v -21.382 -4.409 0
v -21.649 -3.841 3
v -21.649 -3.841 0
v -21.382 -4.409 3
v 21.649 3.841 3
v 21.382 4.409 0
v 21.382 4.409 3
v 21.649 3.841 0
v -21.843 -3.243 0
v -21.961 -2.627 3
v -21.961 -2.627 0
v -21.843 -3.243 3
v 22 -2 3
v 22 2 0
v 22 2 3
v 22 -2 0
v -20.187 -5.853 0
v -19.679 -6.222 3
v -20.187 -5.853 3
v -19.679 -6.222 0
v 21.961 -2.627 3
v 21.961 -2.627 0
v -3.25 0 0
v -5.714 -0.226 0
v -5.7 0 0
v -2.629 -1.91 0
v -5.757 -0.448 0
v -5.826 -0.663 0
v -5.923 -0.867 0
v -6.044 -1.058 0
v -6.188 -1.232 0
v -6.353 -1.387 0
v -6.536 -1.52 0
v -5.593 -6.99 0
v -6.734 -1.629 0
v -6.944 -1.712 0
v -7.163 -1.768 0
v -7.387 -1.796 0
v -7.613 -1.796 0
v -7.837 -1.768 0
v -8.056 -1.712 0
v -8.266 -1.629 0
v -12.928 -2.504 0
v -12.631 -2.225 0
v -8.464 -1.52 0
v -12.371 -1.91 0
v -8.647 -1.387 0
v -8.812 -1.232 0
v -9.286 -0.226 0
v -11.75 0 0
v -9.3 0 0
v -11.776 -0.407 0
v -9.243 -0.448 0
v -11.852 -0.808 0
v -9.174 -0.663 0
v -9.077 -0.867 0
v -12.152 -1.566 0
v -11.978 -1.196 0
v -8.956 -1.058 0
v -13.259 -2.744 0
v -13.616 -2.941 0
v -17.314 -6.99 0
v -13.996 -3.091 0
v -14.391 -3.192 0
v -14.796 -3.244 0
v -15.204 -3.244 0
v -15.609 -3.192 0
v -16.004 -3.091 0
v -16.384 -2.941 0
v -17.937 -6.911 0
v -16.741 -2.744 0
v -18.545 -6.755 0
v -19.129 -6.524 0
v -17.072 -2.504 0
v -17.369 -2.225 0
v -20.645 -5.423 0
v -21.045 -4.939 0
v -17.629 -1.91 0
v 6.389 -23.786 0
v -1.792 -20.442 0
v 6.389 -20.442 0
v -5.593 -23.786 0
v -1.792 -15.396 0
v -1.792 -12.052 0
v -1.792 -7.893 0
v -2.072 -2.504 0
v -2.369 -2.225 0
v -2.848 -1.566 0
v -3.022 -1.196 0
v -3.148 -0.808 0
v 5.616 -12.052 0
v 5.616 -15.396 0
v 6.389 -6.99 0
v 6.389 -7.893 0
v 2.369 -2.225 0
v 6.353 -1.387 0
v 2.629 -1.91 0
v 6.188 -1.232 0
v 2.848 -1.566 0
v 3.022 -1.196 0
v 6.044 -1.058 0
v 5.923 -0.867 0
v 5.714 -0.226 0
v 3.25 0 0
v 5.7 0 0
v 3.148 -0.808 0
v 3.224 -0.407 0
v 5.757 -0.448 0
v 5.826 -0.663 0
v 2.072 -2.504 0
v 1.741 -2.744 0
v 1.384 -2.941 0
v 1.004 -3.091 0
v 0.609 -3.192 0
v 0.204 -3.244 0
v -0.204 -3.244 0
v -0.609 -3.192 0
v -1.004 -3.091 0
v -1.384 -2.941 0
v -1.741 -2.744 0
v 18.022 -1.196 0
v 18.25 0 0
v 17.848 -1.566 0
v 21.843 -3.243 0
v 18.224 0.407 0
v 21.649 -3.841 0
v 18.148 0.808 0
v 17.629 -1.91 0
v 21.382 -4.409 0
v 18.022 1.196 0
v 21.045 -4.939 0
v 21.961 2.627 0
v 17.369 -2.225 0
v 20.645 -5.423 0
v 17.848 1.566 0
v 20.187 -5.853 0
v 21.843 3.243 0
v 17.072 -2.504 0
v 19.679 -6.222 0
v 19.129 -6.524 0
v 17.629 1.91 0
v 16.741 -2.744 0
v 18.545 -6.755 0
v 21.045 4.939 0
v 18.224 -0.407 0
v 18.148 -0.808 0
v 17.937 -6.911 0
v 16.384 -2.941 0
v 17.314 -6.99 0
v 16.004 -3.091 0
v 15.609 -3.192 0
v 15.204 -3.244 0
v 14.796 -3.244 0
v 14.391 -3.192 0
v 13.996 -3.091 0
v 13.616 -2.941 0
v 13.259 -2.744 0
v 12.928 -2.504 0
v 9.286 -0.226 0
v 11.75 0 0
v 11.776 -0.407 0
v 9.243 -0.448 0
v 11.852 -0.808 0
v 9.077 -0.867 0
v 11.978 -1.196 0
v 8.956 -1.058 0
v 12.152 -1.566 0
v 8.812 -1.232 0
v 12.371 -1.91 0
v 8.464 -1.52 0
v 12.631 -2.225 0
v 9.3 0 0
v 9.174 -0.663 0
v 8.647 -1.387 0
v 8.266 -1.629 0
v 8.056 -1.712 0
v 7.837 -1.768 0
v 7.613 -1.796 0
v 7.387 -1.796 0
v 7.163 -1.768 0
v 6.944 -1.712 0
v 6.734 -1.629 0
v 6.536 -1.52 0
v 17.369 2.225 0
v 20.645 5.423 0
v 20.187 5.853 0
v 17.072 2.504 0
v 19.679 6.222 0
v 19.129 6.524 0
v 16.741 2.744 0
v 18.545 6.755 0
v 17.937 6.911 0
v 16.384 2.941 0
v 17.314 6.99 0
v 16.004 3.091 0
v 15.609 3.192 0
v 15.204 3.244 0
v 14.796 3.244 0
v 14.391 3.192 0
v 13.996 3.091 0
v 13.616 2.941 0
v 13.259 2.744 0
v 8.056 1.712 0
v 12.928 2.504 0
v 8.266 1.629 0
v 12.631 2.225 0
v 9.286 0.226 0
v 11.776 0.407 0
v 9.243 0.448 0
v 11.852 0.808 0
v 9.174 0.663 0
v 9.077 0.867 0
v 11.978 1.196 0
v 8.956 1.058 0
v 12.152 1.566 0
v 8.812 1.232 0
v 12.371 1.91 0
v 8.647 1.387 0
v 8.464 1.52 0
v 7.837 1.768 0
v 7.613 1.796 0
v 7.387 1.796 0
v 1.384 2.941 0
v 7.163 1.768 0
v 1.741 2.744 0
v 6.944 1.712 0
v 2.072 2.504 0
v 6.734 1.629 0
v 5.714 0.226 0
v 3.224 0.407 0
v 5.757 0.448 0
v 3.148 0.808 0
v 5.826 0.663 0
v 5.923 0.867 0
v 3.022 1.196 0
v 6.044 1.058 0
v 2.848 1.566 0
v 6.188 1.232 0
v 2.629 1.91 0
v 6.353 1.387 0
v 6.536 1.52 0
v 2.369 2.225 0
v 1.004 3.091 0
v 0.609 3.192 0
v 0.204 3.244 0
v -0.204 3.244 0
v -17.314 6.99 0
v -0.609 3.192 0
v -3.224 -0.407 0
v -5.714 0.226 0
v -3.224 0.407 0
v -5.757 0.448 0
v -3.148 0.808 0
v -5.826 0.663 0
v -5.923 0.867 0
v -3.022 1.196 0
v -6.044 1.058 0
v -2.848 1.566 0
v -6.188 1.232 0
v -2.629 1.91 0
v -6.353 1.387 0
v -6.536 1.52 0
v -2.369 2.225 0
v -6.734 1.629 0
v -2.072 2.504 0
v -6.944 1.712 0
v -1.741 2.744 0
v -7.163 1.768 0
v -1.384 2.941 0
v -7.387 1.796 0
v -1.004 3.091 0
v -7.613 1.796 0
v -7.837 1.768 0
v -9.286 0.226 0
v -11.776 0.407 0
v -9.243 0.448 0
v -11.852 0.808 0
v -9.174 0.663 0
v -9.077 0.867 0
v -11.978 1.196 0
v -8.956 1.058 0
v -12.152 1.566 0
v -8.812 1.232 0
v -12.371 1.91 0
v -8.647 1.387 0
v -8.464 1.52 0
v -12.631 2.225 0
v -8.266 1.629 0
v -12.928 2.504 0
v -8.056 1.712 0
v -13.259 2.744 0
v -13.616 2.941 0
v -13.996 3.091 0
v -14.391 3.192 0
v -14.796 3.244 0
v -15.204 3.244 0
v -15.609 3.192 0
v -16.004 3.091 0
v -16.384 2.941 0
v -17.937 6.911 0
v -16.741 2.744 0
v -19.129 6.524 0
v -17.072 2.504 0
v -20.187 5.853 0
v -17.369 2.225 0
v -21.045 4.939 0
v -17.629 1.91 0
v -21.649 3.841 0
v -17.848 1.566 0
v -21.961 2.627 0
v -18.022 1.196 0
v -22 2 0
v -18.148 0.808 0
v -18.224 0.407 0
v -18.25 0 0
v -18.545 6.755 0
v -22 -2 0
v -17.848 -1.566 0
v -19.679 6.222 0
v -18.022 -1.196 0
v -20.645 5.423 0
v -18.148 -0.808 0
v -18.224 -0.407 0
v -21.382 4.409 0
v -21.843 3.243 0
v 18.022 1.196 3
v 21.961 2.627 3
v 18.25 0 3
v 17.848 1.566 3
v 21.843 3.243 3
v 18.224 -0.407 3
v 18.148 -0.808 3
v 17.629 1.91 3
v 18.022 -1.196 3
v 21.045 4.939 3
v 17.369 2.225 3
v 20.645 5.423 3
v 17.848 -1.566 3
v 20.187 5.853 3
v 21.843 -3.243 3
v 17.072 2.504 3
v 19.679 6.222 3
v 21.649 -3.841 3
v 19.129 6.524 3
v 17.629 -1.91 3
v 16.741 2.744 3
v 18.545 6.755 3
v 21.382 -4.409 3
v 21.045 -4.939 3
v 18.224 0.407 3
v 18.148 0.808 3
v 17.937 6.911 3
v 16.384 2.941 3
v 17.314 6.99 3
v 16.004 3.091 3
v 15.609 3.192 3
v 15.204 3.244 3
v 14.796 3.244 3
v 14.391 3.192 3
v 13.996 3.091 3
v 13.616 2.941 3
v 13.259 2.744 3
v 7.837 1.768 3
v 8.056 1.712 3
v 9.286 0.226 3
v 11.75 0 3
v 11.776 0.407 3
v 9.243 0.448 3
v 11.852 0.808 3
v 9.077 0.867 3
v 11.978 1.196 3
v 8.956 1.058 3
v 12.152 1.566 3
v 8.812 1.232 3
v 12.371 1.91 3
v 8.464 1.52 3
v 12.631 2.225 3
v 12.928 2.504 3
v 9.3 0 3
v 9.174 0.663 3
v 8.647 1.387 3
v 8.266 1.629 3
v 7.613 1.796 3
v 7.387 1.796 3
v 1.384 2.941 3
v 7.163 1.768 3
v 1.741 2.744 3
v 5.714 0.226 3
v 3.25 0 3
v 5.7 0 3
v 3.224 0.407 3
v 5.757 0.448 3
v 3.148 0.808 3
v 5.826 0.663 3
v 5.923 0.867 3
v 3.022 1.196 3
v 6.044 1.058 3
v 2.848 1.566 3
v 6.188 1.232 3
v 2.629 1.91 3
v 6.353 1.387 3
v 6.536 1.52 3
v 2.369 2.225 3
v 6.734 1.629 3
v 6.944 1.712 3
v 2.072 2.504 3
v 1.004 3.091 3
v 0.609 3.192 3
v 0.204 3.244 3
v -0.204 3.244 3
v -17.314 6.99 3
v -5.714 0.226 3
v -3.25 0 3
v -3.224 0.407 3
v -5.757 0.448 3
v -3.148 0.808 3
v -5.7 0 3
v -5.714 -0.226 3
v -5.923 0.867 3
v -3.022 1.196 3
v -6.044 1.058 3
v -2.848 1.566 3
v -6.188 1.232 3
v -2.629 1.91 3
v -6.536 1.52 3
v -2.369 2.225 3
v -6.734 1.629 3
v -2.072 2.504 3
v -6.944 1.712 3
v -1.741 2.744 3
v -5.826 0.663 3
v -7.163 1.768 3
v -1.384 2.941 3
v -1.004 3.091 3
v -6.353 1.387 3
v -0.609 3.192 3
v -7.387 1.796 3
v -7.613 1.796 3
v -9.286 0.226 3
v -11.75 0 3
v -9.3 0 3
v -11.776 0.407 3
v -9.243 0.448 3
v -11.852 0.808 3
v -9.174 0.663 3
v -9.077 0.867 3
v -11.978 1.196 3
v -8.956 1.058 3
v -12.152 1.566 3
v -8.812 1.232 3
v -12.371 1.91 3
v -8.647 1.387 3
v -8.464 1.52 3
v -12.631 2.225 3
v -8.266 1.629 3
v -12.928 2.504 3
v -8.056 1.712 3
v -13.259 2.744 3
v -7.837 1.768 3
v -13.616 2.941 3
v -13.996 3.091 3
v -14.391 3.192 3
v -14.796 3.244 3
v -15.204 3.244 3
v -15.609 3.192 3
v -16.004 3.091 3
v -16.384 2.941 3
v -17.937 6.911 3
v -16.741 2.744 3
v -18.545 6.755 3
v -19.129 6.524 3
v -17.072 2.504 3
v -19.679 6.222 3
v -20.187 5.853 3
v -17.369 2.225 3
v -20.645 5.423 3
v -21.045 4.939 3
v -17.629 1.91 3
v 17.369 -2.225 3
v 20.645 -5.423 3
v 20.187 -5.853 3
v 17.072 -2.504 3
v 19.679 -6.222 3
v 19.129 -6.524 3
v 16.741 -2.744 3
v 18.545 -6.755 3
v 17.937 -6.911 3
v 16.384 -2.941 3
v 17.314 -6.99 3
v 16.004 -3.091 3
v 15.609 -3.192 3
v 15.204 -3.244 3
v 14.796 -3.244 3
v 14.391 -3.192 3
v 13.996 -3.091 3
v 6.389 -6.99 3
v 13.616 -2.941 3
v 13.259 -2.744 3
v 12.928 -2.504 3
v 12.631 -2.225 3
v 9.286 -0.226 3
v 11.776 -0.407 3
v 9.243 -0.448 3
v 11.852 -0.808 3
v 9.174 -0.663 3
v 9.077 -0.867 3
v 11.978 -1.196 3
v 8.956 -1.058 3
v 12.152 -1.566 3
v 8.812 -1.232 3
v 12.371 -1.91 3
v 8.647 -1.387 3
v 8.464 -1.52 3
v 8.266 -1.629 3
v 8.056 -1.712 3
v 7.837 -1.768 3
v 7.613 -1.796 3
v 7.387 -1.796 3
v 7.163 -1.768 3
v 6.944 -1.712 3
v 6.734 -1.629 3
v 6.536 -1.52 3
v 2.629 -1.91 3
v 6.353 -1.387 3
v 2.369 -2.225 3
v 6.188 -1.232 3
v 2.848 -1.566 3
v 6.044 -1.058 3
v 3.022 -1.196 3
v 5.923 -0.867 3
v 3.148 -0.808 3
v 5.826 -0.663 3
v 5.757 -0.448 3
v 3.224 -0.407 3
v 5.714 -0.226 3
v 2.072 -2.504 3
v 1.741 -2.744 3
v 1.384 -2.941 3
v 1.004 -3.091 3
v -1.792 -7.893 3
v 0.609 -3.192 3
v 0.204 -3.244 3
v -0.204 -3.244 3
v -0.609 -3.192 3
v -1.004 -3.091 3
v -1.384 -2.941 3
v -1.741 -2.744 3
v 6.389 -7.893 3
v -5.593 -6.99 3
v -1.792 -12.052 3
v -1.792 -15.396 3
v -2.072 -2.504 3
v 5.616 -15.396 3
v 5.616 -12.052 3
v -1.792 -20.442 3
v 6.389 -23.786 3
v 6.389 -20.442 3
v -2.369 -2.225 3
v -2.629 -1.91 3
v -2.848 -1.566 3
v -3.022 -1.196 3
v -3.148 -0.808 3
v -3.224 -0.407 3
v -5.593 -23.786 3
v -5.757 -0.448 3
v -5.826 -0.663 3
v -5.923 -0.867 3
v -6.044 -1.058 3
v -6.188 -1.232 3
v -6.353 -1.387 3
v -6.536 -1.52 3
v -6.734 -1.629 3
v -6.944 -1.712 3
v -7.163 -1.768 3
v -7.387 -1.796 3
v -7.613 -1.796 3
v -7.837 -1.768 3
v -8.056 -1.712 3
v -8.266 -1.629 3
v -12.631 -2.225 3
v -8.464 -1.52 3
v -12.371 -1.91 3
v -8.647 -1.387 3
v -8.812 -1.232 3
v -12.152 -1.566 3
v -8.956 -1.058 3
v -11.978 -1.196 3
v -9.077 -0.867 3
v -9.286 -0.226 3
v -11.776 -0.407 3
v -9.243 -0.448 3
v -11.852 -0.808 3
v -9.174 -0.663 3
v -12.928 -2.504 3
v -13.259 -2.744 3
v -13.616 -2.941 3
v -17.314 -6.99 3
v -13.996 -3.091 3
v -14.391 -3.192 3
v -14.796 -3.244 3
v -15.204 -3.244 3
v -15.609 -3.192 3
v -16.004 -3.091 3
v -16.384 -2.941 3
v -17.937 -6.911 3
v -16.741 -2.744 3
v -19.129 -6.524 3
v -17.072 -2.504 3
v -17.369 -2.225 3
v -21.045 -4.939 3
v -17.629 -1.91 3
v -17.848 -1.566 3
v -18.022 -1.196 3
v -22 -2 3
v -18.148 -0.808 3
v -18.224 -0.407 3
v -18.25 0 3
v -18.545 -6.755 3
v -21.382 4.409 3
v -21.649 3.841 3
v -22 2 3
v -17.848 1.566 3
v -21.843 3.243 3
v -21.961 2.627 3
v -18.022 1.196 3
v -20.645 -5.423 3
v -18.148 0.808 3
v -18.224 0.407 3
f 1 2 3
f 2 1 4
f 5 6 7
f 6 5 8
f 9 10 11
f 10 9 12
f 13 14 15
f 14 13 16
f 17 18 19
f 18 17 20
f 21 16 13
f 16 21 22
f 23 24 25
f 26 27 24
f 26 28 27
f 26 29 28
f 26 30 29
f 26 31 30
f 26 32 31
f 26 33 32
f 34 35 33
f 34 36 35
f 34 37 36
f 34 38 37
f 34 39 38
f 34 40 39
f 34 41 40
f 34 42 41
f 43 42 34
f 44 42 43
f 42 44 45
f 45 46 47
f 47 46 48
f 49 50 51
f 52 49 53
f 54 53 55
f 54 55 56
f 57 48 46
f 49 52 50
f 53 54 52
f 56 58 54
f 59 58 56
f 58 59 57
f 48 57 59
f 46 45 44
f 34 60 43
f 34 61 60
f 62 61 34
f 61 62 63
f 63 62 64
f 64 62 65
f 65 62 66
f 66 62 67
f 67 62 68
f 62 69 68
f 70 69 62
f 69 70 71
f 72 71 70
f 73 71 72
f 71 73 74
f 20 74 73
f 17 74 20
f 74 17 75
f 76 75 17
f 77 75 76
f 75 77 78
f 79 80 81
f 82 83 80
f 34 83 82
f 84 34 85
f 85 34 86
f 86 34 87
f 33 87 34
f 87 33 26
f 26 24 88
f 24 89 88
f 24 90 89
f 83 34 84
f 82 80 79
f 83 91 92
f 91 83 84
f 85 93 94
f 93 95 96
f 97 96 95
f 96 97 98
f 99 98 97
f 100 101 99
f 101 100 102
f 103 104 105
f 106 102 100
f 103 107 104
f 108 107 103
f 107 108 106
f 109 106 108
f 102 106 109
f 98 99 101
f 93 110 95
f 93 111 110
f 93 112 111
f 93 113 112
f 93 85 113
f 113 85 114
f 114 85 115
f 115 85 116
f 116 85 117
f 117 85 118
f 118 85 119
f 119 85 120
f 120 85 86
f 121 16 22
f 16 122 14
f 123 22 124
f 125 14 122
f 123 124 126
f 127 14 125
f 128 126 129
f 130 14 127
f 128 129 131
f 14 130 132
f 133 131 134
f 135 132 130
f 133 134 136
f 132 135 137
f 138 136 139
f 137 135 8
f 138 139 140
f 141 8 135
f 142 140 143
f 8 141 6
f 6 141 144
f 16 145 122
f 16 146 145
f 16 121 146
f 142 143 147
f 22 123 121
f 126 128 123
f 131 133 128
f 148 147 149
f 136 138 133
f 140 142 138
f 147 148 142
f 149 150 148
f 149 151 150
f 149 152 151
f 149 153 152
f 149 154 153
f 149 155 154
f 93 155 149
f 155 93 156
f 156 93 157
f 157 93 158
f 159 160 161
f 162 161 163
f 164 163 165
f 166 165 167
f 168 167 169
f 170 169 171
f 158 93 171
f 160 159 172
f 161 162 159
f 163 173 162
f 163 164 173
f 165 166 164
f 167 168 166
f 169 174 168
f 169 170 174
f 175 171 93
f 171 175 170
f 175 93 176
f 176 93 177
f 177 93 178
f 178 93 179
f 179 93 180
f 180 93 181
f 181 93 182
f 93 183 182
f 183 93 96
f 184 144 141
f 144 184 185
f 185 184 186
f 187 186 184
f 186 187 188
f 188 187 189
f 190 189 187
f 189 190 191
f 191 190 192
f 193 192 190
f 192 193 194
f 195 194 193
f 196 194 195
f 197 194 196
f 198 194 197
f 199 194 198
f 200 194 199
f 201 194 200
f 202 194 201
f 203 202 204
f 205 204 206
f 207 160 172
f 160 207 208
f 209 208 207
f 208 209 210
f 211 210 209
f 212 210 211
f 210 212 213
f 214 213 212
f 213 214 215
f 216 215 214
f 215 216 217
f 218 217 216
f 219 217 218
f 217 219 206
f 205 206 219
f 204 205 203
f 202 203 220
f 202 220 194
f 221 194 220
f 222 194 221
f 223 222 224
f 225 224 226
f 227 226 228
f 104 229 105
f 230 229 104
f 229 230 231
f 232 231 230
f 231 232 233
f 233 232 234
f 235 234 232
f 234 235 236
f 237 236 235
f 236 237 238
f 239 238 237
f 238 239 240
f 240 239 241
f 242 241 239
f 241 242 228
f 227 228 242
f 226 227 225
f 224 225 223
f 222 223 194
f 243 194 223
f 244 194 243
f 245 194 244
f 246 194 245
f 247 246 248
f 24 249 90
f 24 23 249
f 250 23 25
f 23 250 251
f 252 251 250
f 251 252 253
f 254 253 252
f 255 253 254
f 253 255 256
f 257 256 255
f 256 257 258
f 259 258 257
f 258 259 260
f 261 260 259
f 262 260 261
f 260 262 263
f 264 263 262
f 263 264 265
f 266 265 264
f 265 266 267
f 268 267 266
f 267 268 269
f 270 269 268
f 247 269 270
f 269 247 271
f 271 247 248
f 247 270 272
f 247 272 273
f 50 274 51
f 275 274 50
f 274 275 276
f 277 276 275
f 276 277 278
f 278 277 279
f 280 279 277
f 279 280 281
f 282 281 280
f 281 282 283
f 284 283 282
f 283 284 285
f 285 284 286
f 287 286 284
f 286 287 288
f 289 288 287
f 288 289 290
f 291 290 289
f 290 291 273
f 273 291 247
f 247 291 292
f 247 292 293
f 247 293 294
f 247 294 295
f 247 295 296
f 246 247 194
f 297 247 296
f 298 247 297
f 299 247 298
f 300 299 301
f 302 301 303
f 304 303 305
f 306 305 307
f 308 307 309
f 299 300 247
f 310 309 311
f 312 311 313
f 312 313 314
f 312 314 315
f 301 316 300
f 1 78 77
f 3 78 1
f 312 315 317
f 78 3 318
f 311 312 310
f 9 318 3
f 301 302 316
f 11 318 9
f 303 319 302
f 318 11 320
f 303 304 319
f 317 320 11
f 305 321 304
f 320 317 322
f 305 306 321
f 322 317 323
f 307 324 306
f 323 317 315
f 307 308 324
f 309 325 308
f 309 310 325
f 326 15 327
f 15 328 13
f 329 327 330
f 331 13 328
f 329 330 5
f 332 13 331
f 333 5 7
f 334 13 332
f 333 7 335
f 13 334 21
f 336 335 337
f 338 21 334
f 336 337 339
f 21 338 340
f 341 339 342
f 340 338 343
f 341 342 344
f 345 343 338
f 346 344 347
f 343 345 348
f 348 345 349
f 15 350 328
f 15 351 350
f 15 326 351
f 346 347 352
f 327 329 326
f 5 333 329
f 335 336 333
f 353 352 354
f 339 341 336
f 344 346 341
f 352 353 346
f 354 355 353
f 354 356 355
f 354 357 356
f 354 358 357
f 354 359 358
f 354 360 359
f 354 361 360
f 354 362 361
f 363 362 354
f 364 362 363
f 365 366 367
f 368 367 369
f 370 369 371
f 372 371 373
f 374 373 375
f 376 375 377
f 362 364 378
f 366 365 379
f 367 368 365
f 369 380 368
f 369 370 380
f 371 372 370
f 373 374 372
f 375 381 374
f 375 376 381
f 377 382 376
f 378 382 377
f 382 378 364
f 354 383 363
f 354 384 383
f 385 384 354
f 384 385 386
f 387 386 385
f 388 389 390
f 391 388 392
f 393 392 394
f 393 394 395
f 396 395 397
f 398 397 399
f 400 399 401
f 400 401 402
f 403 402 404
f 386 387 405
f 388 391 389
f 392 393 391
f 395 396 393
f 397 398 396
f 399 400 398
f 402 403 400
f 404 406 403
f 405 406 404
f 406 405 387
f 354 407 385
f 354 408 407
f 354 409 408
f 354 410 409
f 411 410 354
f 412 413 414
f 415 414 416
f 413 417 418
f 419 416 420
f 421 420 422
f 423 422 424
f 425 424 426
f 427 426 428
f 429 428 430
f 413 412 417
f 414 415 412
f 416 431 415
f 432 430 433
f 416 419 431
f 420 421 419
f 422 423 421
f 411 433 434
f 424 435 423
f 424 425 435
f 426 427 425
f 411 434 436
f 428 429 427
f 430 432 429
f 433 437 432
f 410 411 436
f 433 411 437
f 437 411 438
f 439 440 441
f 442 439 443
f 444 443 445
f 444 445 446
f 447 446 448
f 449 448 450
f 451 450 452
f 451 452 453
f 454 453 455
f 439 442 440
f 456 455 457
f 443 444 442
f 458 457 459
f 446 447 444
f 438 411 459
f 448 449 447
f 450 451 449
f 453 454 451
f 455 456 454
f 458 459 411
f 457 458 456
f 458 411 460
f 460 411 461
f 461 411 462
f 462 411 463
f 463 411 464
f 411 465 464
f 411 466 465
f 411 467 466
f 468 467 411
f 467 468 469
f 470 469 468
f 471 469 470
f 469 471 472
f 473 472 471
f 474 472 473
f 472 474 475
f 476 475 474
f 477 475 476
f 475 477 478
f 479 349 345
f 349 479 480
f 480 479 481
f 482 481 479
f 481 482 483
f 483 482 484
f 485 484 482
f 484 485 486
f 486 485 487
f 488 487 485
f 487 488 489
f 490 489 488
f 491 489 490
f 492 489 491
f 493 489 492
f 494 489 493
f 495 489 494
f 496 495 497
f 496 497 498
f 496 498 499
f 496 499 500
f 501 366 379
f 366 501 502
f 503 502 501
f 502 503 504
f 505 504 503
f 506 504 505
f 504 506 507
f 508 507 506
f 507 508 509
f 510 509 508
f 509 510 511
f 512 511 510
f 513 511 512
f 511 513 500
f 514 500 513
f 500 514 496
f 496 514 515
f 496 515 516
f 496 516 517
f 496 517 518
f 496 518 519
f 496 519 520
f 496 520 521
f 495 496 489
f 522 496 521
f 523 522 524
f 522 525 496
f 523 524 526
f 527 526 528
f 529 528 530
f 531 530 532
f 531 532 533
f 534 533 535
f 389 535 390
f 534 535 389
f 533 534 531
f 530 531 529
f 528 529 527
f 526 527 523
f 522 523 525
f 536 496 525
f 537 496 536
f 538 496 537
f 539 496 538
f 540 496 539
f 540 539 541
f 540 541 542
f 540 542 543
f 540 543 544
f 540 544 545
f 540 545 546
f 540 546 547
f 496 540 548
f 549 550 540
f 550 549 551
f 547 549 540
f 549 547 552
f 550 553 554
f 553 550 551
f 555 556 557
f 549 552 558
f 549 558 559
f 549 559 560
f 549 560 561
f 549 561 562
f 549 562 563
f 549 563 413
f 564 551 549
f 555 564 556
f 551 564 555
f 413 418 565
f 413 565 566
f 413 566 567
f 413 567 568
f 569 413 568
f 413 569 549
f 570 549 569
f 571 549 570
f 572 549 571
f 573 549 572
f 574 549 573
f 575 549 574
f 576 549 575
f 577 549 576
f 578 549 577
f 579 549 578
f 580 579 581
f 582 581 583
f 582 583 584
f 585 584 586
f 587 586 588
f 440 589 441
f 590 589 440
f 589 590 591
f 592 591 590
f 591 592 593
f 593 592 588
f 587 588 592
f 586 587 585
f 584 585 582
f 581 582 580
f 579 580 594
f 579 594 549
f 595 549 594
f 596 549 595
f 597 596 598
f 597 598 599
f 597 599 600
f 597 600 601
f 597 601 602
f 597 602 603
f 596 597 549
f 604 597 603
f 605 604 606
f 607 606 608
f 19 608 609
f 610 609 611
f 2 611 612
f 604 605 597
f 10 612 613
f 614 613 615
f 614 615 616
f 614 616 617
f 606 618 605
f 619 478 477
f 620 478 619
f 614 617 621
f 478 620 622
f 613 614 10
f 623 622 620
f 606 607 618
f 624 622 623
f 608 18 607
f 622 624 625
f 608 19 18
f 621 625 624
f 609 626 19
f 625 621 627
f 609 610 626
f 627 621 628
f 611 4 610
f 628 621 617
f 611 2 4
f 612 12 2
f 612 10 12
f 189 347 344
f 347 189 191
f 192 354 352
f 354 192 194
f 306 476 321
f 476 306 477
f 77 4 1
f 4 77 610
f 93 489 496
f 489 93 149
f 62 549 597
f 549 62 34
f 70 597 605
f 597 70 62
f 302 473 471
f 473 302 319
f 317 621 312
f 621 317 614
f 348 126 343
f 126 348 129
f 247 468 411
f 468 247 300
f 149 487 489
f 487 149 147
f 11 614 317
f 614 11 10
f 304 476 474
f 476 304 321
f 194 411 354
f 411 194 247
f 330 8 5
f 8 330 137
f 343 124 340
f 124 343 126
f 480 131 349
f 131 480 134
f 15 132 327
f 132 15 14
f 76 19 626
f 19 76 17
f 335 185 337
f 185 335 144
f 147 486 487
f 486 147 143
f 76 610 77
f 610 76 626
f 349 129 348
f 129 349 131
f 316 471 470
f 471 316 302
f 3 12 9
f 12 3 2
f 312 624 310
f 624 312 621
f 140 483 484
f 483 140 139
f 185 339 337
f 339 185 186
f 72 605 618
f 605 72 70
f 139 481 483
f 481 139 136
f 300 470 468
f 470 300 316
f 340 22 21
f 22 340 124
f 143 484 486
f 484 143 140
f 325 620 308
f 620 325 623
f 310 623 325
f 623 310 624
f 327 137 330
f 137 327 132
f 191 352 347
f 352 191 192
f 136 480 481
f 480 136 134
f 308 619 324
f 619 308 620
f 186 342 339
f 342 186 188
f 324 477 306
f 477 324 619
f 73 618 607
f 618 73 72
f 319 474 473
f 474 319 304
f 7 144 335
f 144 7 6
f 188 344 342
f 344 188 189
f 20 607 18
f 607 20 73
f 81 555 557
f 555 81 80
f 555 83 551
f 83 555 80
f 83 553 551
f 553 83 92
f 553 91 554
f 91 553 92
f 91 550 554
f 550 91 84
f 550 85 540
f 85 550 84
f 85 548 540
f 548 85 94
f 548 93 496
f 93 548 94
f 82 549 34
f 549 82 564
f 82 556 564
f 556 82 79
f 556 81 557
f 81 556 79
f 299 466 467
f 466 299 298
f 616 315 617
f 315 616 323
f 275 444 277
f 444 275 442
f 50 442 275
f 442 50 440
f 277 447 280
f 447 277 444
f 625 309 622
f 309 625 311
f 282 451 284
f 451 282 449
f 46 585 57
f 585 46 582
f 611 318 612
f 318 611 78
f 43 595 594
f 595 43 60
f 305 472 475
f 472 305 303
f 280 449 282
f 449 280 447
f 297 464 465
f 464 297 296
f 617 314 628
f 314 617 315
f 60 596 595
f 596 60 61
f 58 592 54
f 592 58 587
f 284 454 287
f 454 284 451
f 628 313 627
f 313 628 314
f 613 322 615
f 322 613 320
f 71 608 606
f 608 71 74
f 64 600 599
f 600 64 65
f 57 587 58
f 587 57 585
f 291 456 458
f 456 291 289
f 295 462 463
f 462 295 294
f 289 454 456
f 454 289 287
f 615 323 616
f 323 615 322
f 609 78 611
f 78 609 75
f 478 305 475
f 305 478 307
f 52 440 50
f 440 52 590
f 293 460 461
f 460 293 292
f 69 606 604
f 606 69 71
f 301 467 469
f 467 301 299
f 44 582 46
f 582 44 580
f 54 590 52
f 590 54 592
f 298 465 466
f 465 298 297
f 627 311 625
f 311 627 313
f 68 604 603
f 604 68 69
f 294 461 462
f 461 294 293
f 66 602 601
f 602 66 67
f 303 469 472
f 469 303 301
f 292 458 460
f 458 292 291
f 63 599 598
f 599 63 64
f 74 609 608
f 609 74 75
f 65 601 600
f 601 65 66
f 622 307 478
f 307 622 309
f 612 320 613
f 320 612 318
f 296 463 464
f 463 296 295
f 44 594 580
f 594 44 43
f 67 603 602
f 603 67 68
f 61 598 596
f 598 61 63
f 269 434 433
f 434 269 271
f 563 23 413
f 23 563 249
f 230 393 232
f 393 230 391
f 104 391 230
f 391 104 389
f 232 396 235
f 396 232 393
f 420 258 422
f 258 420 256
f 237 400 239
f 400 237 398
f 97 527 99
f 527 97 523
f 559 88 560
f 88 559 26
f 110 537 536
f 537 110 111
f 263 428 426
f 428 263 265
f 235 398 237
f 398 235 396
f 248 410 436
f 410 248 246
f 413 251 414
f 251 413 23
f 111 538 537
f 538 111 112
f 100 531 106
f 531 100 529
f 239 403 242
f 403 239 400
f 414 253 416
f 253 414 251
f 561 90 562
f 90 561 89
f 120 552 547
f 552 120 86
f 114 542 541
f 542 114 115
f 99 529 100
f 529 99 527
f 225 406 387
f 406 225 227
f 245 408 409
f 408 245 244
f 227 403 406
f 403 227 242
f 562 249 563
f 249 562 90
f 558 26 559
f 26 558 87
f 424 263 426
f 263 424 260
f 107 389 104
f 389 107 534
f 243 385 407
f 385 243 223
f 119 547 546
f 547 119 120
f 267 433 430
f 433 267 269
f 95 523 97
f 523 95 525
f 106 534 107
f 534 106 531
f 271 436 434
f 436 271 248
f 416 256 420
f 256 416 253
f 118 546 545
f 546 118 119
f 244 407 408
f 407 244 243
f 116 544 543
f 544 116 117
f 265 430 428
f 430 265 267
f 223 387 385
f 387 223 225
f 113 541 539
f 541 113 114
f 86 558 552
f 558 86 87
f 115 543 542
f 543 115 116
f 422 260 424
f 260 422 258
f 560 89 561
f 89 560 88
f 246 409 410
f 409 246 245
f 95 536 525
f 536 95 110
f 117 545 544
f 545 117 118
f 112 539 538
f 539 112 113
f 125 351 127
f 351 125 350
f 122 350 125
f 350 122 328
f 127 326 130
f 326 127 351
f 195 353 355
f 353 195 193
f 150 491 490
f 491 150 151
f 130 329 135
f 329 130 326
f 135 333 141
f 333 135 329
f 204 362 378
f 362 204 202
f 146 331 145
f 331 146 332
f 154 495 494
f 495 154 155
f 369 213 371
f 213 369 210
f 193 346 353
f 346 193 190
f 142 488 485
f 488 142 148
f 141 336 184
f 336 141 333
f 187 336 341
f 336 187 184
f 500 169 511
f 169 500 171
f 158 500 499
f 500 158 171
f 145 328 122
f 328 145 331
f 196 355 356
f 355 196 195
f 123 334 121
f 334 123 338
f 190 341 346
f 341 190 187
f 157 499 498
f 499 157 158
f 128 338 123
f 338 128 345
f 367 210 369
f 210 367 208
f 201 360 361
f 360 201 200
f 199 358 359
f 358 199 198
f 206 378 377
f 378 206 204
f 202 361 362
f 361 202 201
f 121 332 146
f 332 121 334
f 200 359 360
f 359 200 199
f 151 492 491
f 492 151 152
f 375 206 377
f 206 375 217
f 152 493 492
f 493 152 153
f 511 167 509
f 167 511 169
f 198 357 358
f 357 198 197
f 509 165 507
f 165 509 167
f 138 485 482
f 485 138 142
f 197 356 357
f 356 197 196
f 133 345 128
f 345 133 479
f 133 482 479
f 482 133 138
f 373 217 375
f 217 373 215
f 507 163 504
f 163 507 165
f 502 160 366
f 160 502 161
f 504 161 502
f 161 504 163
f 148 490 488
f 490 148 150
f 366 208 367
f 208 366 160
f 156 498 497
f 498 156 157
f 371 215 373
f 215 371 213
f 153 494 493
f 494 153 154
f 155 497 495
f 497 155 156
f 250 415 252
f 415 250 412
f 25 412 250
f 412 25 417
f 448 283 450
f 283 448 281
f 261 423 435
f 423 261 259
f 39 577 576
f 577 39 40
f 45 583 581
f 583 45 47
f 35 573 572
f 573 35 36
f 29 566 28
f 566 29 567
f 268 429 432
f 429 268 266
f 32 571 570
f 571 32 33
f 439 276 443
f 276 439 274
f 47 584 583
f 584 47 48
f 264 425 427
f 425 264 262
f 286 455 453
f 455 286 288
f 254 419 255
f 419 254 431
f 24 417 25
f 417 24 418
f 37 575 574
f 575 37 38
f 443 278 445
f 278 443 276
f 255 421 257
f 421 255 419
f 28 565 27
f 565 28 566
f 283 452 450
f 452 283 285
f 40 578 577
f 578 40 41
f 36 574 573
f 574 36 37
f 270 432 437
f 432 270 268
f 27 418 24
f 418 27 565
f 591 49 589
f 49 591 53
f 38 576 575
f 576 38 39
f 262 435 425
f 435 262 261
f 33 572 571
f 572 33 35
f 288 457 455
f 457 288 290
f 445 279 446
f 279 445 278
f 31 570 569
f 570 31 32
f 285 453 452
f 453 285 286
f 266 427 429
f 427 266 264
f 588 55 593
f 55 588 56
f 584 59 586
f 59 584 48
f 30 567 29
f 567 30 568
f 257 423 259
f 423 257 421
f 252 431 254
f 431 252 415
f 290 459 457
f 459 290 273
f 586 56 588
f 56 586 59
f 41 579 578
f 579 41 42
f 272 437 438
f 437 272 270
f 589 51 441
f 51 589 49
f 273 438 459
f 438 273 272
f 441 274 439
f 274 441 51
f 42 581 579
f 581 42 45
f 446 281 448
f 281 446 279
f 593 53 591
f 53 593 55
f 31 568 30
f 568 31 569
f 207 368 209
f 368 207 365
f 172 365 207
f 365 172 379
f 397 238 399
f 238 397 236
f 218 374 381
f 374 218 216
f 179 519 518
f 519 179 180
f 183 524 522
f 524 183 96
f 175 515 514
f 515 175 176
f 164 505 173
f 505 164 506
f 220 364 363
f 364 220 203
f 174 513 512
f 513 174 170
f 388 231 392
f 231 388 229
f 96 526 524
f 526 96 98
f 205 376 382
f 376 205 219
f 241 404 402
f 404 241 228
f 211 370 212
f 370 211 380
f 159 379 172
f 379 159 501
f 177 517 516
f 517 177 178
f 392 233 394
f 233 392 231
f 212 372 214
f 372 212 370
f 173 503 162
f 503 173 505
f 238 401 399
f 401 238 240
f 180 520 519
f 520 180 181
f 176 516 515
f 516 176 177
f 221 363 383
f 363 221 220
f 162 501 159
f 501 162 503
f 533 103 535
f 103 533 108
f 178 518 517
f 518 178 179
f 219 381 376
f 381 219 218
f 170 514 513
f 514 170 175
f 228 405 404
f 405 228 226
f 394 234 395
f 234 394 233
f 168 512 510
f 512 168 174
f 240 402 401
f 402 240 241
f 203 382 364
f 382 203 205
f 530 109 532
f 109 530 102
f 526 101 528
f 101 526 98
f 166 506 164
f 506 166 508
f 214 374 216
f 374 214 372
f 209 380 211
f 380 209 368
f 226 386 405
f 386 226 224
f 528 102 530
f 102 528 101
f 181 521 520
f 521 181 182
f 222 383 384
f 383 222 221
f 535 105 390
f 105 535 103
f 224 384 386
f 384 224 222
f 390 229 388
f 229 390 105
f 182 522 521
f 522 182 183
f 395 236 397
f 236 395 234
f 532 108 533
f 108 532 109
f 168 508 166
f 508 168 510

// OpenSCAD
$fn = 50;


difference() {
	union() {
		hull() {
			translate(v = [-17.0000000000, 2.0000000000, 0]) {
				cylinder(h = 3, r = 5);
			}
			translate(v = [17.0000000000, 2.0000000000, 0]) {
				cylinder(h = 3, r = 5);
			}
			translate(v = [-17.0000000000, -2.0000000000, 0]) {
				cylinder(h = 3, r = 5);
			}
			translate(v = [17.0000000000, -2.0000000000, 0]) {
				cylinder(h = 3, r = 5);
			}
		}
		translate(v = [0, -5, 0]) {
			linear_extrude(height = 3) {
				text(font = "DejaVu Sans Mono:style=Bold", halign = "center", size = 19.0000000000, text = "E", valign = "top");
			}
		}
	}
	union() {
		translate(v = [-15.0000000000, 0.0000000000, 0]) {
			translate(v = [0, 0, -100]) {
				cylinder(h = 200, r = 3.2500000000);
			}
		}
		translate(v = [0, 0, -100]) {
			cylinder(h = 200, r = 3.2500000000);
		}
		translate(v = [15.0000000000, 0.0000000000, 0]) {
			translate(v = [0, 0, -100]) {
				cylinder(h = 200, r = 3.2500000000);
			}
		}
		translate(v = [-15.0000000000, 0.0000000000, 0]) {
			translate(v = [0, 0, -100]) {
				cylinder(h = 200, r = 1.8000000000);
			}
		}
		translate(v = [-7.5000000000, 0.0000000000, 0]) {
			translate(v = [0, 0, -100]) {
				cylinder(h = 200, r = 1.8000000000);
			}
		}
		translate(v = [0, 0, -100]) {
			cylinder(h = 200, r = 1.8000000000);
		}
		translate(v = [7.5000000000, 0.0000000000, 0]) {
			translate(v = [0, 0, -100]) {
				cylinder(h = 200, r = 1.8000000000);
			}
		}
		translate(v = [15.0000000000, 0.0000000000, 0]) {
			translate(v = [0, 0, -100]) {
				cylinder(h = 200, r = 1.8000000000);
			}
		}
	}
}
